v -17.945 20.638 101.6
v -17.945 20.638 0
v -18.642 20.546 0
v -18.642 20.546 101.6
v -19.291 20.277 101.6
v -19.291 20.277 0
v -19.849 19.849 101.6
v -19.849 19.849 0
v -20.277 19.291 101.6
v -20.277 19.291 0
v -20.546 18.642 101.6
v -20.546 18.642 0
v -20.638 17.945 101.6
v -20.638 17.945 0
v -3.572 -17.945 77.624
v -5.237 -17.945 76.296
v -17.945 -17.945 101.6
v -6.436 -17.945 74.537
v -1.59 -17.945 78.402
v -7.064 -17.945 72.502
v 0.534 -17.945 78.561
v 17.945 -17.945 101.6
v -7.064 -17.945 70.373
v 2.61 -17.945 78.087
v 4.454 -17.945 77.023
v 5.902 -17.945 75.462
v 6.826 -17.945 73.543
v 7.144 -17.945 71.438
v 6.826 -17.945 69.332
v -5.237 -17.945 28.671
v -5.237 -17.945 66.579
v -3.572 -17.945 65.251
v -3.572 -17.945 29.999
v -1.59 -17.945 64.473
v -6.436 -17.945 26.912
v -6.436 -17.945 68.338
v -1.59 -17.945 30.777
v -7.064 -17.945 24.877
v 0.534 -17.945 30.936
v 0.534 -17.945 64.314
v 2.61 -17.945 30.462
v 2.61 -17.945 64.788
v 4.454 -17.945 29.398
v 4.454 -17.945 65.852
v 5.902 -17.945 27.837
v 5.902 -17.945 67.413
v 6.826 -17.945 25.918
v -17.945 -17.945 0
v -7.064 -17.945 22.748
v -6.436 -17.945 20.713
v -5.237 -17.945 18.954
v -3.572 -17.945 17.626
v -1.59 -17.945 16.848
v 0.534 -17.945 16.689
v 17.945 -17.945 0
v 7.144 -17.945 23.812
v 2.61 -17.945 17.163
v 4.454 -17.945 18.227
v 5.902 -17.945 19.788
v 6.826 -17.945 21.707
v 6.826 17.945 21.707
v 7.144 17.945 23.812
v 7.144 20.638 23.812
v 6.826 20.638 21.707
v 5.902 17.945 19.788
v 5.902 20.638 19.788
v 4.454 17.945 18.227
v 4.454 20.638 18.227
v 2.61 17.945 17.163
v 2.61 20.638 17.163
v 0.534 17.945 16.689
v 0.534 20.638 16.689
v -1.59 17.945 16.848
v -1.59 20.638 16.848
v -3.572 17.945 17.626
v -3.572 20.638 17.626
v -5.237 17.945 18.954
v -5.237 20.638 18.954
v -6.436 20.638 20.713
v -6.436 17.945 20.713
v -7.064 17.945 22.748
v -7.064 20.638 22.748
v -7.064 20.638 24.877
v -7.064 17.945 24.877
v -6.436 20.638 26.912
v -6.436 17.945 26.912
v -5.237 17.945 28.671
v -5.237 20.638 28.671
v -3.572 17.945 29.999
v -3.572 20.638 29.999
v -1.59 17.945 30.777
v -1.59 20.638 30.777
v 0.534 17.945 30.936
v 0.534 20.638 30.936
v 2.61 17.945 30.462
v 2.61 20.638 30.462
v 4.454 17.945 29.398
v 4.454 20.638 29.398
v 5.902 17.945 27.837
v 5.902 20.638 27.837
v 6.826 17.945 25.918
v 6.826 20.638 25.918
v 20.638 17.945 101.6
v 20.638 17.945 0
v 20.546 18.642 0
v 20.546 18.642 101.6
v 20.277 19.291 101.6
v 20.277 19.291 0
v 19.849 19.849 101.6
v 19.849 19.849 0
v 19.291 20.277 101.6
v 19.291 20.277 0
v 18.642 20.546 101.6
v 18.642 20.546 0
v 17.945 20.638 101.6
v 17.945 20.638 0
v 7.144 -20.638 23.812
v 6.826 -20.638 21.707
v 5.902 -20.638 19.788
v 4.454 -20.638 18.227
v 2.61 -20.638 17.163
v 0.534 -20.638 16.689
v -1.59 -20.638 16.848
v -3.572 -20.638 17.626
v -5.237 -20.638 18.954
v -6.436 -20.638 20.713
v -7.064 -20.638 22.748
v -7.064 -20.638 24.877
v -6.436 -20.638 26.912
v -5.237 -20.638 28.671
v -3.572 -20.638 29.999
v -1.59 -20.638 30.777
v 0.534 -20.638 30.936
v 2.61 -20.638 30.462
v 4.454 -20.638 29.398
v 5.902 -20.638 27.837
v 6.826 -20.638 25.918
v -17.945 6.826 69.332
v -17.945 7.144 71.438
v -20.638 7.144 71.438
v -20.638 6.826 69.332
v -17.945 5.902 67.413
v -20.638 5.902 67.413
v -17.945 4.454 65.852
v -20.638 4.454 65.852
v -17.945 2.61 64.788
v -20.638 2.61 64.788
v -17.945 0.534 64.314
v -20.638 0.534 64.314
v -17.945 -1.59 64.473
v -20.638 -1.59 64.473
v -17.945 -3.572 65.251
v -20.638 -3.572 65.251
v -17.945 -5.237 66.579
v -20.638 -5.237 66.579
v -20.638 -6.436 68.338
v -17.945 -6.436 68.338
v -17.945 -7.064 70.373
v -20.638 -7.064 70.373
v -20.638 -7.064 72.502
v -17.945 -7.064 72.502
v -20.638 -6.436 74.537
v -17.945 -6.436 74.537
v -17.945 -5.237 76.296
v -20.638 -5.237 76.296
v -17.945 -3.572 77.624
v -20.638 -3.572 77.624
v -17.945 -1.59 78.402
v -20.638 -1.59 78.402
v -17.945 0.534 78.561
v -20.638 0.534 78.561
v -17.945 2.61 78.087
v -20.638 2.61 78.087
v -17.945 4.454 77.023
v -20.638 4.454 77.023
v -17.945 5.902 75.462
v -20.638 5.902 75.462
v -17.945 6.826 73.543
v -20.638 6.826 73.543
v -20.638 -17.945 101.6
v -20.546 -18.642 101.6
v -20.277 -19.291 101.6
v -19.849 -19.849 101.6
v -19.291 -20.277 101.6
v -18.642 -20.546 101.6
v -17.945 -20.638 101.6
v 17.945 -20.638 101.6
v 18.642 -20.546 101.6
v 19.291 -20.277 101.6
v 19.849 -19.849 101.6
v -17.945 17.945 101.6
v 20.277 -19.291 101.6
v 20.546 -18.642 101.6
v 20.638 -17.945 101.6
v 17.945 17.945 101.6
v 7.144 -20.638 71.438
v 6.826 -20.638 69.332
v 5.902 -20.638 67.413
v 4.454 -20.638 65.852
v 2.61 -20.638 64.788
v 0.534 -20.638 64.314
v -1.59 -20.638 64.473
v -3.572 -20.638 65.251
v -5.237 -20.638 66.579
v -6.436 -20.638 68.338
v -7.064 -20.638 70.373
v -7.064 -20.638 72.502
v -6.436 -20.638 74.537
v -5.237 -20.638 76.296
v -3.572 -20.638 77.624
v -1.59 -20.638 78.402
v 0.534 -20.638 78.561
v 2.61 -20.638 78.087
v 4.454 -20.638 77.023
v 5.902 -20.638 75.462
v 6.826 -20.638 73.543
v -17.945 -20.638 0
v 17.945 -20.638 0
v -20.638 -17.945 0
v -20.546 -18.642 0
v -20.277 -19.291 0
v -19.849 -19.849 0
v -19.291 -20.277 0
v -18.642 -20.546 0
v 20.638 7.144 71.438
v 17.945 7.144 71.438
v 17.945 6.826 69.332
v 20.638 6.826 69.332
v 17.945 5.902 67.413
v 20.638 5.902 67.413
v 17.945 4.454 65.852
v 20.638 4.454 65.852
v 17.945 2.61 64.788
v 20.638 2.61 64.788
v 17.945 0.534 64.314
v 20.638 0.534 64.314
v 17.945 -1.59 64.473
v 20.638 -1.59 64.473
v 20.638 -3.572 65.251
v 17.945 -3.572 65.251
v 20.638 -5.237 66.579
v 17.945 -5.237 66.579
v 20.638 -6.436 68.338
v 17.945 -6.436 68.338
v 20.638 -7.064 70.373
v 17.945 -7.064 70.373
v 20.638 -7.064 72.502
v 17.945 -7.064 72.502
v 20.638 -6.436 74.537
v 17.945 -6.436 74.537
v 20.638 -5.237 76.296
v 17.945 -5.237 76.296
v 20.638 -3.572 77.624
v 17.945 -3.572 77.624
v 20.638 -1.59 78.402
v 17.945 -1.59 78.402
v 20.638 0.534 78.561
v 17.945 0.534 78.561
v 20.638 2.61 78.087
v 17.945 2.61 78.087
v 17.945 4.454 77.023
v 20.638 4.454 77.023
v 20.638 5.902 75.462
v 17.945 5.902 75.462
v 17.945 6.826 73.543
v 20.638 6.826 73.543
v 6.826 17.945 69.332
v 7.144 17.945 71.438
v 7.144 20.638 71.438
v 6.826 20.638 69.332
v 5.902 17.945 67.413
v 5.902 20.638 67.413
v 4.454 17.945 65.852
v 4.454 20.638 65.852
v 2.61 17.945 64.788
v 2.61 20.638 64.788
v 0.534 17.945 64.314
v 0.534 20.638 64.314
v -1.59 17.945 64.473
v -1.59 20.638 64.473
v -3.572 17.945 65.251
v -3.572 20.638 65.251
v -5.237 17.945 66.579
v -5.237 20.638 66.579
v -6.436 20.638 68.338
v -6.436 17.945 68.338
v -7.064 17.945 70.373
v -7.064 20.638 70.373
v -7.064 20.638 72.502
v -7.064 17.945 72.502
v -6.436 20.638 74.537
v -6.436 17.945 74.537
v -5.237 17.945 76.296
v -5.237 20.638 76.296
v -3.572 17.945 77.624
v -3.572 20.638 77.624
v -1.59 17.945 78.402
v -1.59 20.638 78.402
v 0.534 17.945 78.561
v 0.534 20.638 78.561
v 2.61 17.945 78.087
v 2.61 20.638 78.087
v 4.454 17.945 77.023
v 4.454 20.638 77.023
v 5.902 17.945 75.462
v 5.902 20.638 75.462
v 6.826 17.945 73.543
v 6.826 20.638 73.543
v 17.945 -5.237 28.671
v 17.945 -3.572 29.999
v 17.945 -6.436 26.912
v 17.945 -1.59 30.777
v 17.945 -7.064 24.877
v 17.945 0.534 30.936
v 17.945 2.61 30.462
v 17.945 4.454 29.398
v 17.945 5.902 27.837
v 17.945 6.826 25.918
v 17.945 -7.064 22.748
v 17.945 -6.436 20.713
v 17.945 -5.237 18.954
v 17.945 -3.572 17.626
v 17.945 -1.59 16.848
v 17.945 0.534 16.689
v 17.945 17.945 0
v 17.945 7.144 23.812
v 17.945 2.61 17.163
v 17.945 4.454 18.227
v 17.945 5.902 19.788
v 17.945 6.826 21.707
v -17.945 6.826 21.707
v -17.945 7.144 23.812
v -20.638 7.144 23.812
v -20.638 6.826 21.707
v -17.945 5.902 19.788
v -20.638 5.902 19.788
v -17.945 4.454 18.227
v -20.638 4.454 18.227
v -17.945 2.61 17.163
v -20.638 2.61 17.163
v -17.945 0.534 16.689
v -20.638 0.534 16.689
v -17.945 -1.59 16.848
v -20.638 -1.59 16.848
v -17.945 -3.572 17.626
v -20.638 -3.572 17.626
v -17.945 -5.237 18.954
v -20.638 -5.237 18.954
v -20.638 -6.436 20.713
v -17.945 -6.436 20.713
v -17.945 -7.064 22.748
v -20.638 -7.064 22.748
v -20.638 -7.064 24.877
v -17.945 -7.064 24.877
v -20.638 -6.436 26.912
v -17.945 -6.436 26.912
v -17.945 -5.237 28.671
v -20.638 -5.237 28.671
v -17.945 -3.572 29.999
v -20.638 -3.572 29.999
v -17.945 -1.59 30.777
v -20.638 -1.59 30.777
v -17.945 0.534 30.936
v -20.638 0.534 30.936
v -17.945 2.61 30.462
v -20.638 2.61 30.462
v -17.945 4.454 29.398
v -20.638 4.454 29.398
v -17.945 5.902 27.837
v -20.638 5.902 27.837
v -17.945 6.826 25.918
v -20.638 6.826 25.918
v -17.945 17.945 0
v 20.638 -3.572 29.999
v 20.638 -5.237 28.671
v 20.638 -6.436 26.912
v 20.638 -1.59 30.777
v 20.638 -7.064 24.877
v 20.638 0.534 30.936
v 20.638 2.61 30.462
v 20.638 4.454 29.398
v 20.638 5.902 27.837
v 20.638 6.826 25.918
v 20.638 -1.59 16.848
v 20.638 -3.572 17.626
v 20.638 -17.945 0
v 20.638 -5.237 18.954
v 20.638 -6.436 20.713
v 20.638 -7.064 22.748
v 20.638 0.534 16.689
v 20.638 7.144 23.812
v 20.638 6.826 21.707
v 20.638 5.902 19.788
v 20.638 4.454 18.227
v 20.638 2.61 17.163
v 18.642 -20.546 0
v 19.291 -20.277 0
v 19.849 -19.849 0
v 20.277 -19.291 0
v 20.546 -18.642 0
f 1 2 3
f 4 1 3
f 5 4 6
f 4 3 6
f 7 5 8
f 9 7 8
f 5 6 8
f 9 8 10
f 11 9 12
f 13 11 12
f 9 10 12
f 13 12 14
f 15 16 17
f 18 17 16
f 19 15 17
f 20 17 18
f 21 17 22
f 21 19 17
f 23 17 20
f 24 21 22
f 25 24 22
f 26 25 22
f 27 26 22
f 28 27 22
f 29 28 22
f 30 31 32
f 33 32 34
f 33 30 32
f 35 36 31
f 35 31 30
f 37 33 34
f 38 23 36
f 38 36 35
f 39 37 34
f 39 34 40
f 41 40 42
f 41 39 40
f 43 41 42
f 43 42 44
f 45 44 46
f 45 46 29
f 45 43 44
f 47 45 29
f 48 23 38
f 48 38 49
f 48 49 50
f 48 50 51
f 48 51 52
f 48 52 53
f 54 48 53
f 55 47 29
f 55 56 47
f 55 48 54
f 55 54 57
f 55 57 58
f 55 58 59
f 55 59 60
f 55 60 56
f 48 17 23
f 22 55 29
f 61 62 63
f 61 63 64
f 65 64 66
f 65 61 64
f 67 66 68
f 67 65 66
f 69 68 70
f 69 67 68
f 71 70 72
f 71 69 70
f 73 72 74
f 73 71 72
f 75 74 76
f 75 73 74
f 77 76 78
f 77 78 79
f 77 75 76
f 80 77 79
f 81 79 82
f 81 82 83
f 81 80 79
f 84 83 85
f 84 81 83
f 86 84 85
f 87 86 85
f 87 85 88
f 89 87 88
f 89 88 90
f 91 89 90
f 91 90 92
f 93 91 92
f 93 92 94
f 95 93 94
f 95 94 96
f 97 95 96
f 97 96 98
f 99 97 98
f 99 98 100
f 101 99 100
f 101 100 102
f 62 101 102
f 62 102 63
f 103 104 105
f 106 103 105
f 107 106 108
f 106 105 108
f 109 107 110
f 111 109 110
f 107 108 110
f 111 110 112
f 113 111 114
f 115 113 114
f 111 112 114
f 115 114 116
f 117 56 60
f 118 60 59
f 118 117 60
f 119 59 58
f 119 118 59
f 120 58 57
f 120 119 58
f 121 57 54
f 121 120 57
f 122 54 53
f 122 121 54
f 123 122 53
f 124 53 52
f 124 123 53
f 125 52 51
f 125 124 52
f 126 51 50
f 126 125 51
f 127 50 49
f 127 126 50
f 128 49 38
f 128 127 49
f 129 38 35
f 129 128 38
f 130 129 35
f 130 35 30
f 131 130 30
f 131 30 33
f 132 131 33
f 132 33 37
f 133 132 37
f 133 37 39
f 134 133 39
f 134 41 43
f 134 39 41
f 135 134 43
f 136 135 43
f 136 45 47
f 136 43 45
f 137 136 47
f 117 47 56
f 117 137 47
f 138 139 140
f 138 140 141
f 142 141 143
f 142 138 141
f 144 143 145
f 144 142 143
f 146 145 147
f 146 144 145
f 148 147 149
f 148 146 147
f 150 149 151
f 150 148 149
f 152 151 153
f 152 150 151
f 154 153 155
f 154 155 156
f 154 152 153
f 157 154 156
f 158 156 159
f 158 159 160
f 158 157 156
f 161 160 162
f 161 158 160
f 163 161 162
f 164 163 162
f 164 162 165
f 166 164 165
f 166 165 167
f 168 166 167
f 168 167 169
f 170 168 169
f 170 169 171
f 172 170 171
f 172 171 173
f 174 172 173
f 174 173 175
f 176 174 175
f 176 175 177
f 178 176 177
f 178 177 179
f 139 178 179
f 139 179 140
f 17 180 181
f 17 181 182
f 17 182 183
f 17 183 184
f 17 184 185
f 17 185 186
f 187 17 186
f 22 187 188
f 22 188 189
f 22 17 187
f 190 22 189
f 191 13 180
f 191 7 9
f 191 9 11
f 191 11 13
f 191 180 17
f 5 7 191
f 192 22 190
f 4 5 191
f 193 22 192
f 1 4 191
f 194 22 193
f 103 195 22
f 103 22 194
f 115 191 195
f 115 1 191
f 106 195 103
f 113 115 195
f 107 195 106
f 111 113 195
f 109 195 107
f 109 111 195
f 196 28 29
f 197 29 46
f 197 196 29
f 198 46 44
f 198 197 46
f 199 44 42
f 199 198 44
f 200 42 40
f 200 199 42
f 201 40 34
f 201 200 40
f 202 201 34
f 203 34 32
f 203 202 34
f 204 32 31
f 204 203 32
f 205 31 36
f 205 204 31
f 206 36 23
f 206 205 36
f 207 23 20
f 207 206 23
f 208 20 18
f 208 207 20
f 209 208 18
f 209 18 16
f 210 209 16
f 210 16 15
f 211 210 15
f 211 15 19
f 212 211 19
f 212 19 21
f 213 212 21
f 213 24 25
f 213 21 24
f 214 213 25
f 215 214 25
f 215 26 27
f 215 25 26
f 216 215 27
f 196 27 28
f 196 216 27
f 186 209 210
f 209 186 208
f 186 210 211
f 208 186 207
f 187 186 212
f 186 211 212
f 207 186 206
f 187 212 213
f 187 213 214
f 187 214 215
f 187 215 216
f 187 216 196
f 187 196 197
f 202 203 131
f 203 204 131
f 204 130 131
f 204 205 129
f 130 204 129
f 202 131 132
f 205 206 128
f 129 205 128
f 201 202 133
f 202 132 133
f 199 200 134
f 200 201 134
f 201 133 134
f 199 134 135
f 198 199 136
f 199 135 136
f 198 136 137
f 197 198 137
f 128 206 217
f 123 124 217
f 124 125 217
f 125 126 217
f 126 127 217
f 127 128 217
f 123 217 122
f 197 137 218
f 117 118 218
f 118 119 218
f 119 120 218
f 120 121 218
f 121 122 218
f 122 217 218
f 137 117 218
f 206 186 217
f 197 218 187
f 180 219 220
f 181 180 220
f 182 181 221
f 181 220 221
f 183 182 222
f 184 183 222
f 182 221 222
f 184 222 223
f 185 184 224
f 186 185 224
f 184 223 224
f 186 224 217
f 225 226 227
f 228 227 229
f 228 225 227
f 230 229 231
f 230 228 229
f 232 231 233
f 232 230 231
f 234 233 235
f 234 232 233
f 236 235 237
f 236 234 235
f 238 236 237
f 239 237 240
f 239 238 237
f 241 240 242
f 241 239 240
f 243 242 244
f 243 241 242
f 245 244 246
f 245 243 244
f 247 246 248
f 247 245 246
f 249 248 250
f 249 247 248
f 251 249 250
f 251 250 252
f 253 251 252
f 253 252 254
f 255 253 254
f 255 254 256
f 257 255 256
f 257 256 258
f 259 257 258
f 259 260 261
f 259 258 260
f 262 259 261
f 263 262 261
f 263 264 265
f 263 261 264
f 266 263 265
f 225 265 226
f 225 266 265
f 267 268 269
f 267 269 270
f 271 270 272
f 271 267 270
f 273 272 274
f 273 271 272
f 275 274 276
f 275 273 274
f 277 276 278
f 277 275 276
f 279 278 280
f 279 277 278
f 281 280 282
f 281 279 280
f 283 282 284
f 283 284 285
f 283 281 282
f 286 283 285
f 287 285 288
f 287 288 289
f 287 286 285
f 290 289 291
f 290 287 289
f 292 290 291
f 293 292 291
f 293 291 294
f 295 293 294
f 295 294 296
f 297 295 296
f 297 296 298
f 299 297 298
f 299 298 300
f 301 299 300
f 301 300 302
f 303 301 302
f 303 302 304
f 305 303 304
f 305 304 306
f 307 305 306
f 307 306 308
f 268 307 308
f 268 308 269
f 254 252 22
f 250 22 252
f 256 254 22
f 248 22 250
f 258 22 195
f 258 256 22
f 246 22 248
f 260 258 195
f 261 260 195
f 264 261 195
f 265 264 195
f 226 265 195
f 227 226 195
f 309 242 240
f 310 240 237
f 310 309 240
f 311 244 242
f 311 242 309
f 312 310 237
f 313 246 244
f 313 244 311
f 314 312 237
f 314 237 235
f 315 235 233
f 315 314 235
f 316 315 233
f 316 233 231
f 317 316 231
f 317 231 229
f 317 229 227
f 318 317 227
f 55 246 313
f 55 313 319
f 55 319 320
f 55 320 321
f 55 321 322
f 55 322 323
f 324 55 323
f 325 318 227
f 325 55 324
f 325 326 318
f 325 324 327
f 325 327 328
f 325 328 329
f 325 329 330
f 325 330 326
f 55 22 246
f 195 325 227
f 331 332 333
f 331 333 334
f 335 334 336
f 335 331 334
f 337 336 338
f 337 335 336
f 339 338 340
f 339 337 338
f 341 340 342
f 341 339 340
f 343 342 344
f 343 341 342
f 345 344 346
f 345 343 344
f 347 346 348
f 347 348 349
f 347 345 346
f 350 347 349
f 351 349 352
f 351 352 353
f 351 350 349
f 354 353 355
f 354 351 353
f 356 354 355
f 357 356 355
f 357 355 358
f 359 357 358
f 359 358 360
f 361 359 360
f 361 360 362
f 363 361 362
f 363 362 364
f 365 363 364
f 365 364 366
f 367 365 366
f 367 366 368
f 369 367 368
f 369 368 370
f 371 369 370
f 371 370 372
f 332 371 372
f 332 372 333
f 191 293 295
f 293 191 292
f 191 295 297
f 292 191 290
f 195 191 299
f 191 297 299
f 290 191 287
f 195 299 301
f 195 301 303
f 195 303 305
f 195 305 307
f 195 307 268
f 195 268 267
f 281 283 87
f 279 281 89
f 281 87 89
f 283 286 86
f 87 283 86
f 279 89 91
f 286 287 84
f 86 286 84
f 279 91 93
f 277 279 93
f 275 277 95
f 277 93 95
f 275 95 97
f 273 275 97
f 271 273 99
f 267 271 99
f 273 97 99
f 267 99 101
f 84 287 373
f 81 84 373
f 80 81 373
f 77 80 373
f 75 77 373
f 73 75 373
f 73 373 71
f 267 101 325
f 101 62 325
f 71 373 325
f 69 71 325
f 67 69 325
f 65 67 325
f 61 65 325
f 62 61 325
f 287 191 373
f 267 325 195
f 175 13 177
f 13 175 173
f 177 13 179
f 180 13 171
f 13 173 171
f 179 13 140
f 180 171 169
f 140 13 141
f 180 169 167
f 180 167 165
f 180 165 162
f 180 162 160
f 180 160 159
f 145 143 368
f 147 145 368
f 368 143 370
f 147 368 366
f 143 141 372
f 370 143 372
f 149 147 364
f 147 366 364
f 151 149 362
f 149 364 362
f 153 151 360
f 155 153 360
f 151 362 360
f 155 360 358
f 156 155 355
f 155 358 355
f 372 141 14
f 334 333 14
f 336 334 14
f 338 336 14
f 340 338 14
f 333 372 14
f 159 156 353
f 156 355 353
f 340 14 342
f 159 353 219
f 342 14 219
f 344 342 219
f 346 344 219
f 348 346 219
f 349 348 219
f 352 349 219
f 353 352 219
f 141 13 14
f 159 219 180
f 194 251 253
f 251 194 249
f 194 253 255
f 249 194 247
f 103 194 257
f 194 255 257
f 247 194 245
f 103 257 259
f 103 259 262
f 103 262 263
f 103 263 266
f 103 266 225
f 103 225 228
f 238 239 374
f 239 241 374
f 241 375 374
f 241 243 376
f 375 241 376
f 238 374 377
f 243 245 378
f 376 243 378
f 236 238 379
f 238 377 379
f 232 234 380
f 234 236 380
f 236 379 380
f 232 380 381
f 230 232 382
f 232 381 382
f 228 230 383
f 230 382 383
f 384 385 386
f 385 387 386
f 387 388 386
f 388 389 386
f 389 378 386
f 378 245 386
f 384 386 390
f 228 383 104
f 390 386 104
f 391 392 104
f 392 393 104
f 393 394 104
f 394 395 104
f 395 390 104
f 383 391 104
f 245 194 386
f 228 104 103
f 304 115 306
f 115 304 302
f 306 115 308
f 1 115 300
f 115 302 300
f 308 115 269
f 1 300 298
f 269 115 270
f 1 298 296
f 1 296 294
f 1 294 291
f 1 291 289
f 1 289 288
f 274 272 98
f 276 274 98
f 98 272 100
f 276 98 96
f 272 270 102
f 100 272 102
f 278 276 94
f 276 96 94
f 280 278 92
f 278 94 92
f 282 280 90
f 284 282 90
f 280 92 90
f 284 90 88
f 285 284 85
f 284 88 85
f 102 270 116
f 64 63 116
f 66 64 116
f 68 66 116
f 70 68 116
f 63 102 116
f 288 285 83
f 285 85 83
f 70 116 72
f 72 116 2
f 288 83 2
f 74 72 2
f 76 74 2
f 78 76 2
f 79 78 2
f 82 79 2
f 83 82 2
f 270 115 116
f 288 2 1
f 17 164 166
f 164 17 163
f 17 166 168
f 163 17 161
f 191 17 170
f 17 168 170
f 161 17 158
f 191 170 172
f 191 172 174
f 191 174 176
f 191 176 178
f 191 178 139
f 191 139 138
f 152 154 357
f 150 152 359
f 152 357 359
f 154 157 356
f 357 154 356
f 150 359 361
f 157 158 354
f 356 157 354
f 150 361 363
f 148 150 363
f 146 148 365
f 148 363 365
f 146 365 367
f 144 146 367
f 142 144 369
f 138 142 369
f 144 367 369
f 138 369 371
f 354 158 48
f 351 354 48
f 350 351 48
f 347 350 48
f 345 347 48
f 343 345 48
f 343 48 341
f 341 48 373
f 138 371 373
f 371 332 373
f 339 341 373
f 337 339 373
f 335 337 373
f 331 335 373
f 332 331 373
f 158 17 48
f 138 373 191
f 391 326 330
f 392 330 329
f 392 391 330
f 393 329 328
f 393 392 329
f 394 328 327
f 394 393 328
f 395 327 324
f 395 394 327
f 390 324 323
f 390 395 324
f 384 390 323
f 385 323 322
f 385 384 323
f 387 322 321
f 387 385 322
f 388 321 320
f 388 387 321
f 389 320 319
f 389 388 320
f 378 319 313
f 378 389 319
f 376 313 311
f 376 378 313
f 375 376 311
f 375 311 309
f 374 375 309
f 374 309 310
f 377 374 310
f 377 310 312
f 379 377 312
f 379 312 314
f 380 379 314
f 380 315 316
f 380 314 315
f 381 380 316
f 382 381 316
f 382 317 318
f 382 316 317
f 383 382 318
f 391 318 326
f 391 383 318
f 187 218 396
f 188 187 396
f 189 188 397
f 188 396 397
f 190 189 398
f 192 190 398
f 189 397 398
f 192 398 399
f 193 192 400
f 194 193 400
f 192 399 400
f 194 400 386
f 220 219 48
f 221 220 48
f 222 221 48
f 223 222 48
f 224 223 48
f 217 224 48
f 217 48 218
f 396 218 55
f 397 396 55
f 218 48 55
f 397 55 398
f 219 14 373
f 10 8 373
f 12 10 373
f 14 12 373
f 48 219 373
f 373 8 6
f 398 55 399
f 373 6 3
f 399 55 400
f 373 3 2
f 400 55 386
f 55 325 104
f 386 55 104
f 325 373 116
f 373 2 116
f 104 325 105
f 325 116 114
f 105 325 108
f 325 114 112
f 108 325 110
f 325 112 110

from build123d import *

# Parameters (mm, degrees)
SKETCH1_W                 = 35.8902
SKETCH1_H                 = 35.8902
BASE_EXTRUDE_DEPTH        = 101.6
HOLE1_START               = -20.6375
HOLE1_OUTLINE_R           = 7.14375
HOLE1_DEPTH               = 41.275
CIRPATTERN2_COUNT         = 2
CIRPATTERN2_ANGLE         = 90
LPATTERN1_COUNT           = 2
LPATTERN1_PITCH           = 47.625
LPATTERN1_START           = -20.6375
LPATTERN1_COPY_1_SKETCH_R = 7.14375
LPATTERN1_COPY_1_DEPTH    = 41.275


# Read off the part's stored shape, not the designer's step: Hole1
with BuildPart() as part:
    # Sketch1 → Base-Extrude (new body)
    with BuildSketch(Plane.XY):
        with BuildLine():
            Line((-20.6375, 17.9451), (-20.6375, -17.9451))
            ThreePointArc((-20.6375, -17.9451), (-19.848914298, -19.848914298), (-17.9451, -20.6375))
            Line((-17.9451, -20.6375), (17.9451, -20.6375))
            ThreePointArc((17.9451, -20.6375), (19.848914298, -19.848914298), (20.6375, -17.9451))
            Line((20.6375, -17.9451), (20.6375, 17.9451))
            ThreePointArc((20.6375, 17.9451), (19.848914298, 19.848914298), (17.9451, 20.6375))
            Line((17.9451, 20.6375), (-17.9451, 20.6375))
            ThreePointArc((-17.9451, 20.6375), (-19.848914298, 19.848914298), (-20.6375, 17.9451))
        make_face()
        Rectangle(SKETCH1_W, SKETCH1_H, mode=Mode.SUBTRACT)
    extrude(amount=BASE_EXTRUDE_DEPTH)

    # Hole1 outline → Hole1 (cut)
    with BuildSketch(Plane(origin=(0, 0, 0), x_dir=(1, 0, 0), z_dir=(0, 1, 0)).offset(HOLE1_START)):
        with Locations((0, -23.8125)):
            Circle(HOLE1_OUTLINE_R)
    hole1 = extrude(amount=HOLE1_DEPTH, mode=Mode.SUBTRACT)

    # CirPattern2: Hole1 ×2 about axis
    cirpattern2_axis = Axis((0, 0, -50), (0, 0, 1))
    for i in range(1, CIRPATTERN2_COUNT):
        add(hole1.rotate(cirpattern2_axis, i * CIRPATTERN2_ANGLE / (CIRPATTERN2_COUNT - 1)), mode=Mode.SUBTRACT)

    # LPattern1: Hole1 ×2
    with Locations(*[(0, 0, i * LPATTERN1_PITCH) for i in range(1, LPATTERN1_COUNT)]):
        add(hole1, mode=Mode.SUBTRACT)

    # LPattern1 copy 1 sketch → LPattern1 copy 1 (cut)
    with BuildSketch(Plane(origin=(0, 0, 47.625), x_dir=(0, 1, 0), z_dir=(-1, 0, 0)).offset(LPATTERN1_START)):
        with Locations((0, -23.8125)):
            Circle(LPATTERN1_COPY_1_SKETCH_R)
    extrude(amount=LPATTERN1_COPY_1_DEPTH, mode=Mode.SUBTRACT)


solid = part.part
